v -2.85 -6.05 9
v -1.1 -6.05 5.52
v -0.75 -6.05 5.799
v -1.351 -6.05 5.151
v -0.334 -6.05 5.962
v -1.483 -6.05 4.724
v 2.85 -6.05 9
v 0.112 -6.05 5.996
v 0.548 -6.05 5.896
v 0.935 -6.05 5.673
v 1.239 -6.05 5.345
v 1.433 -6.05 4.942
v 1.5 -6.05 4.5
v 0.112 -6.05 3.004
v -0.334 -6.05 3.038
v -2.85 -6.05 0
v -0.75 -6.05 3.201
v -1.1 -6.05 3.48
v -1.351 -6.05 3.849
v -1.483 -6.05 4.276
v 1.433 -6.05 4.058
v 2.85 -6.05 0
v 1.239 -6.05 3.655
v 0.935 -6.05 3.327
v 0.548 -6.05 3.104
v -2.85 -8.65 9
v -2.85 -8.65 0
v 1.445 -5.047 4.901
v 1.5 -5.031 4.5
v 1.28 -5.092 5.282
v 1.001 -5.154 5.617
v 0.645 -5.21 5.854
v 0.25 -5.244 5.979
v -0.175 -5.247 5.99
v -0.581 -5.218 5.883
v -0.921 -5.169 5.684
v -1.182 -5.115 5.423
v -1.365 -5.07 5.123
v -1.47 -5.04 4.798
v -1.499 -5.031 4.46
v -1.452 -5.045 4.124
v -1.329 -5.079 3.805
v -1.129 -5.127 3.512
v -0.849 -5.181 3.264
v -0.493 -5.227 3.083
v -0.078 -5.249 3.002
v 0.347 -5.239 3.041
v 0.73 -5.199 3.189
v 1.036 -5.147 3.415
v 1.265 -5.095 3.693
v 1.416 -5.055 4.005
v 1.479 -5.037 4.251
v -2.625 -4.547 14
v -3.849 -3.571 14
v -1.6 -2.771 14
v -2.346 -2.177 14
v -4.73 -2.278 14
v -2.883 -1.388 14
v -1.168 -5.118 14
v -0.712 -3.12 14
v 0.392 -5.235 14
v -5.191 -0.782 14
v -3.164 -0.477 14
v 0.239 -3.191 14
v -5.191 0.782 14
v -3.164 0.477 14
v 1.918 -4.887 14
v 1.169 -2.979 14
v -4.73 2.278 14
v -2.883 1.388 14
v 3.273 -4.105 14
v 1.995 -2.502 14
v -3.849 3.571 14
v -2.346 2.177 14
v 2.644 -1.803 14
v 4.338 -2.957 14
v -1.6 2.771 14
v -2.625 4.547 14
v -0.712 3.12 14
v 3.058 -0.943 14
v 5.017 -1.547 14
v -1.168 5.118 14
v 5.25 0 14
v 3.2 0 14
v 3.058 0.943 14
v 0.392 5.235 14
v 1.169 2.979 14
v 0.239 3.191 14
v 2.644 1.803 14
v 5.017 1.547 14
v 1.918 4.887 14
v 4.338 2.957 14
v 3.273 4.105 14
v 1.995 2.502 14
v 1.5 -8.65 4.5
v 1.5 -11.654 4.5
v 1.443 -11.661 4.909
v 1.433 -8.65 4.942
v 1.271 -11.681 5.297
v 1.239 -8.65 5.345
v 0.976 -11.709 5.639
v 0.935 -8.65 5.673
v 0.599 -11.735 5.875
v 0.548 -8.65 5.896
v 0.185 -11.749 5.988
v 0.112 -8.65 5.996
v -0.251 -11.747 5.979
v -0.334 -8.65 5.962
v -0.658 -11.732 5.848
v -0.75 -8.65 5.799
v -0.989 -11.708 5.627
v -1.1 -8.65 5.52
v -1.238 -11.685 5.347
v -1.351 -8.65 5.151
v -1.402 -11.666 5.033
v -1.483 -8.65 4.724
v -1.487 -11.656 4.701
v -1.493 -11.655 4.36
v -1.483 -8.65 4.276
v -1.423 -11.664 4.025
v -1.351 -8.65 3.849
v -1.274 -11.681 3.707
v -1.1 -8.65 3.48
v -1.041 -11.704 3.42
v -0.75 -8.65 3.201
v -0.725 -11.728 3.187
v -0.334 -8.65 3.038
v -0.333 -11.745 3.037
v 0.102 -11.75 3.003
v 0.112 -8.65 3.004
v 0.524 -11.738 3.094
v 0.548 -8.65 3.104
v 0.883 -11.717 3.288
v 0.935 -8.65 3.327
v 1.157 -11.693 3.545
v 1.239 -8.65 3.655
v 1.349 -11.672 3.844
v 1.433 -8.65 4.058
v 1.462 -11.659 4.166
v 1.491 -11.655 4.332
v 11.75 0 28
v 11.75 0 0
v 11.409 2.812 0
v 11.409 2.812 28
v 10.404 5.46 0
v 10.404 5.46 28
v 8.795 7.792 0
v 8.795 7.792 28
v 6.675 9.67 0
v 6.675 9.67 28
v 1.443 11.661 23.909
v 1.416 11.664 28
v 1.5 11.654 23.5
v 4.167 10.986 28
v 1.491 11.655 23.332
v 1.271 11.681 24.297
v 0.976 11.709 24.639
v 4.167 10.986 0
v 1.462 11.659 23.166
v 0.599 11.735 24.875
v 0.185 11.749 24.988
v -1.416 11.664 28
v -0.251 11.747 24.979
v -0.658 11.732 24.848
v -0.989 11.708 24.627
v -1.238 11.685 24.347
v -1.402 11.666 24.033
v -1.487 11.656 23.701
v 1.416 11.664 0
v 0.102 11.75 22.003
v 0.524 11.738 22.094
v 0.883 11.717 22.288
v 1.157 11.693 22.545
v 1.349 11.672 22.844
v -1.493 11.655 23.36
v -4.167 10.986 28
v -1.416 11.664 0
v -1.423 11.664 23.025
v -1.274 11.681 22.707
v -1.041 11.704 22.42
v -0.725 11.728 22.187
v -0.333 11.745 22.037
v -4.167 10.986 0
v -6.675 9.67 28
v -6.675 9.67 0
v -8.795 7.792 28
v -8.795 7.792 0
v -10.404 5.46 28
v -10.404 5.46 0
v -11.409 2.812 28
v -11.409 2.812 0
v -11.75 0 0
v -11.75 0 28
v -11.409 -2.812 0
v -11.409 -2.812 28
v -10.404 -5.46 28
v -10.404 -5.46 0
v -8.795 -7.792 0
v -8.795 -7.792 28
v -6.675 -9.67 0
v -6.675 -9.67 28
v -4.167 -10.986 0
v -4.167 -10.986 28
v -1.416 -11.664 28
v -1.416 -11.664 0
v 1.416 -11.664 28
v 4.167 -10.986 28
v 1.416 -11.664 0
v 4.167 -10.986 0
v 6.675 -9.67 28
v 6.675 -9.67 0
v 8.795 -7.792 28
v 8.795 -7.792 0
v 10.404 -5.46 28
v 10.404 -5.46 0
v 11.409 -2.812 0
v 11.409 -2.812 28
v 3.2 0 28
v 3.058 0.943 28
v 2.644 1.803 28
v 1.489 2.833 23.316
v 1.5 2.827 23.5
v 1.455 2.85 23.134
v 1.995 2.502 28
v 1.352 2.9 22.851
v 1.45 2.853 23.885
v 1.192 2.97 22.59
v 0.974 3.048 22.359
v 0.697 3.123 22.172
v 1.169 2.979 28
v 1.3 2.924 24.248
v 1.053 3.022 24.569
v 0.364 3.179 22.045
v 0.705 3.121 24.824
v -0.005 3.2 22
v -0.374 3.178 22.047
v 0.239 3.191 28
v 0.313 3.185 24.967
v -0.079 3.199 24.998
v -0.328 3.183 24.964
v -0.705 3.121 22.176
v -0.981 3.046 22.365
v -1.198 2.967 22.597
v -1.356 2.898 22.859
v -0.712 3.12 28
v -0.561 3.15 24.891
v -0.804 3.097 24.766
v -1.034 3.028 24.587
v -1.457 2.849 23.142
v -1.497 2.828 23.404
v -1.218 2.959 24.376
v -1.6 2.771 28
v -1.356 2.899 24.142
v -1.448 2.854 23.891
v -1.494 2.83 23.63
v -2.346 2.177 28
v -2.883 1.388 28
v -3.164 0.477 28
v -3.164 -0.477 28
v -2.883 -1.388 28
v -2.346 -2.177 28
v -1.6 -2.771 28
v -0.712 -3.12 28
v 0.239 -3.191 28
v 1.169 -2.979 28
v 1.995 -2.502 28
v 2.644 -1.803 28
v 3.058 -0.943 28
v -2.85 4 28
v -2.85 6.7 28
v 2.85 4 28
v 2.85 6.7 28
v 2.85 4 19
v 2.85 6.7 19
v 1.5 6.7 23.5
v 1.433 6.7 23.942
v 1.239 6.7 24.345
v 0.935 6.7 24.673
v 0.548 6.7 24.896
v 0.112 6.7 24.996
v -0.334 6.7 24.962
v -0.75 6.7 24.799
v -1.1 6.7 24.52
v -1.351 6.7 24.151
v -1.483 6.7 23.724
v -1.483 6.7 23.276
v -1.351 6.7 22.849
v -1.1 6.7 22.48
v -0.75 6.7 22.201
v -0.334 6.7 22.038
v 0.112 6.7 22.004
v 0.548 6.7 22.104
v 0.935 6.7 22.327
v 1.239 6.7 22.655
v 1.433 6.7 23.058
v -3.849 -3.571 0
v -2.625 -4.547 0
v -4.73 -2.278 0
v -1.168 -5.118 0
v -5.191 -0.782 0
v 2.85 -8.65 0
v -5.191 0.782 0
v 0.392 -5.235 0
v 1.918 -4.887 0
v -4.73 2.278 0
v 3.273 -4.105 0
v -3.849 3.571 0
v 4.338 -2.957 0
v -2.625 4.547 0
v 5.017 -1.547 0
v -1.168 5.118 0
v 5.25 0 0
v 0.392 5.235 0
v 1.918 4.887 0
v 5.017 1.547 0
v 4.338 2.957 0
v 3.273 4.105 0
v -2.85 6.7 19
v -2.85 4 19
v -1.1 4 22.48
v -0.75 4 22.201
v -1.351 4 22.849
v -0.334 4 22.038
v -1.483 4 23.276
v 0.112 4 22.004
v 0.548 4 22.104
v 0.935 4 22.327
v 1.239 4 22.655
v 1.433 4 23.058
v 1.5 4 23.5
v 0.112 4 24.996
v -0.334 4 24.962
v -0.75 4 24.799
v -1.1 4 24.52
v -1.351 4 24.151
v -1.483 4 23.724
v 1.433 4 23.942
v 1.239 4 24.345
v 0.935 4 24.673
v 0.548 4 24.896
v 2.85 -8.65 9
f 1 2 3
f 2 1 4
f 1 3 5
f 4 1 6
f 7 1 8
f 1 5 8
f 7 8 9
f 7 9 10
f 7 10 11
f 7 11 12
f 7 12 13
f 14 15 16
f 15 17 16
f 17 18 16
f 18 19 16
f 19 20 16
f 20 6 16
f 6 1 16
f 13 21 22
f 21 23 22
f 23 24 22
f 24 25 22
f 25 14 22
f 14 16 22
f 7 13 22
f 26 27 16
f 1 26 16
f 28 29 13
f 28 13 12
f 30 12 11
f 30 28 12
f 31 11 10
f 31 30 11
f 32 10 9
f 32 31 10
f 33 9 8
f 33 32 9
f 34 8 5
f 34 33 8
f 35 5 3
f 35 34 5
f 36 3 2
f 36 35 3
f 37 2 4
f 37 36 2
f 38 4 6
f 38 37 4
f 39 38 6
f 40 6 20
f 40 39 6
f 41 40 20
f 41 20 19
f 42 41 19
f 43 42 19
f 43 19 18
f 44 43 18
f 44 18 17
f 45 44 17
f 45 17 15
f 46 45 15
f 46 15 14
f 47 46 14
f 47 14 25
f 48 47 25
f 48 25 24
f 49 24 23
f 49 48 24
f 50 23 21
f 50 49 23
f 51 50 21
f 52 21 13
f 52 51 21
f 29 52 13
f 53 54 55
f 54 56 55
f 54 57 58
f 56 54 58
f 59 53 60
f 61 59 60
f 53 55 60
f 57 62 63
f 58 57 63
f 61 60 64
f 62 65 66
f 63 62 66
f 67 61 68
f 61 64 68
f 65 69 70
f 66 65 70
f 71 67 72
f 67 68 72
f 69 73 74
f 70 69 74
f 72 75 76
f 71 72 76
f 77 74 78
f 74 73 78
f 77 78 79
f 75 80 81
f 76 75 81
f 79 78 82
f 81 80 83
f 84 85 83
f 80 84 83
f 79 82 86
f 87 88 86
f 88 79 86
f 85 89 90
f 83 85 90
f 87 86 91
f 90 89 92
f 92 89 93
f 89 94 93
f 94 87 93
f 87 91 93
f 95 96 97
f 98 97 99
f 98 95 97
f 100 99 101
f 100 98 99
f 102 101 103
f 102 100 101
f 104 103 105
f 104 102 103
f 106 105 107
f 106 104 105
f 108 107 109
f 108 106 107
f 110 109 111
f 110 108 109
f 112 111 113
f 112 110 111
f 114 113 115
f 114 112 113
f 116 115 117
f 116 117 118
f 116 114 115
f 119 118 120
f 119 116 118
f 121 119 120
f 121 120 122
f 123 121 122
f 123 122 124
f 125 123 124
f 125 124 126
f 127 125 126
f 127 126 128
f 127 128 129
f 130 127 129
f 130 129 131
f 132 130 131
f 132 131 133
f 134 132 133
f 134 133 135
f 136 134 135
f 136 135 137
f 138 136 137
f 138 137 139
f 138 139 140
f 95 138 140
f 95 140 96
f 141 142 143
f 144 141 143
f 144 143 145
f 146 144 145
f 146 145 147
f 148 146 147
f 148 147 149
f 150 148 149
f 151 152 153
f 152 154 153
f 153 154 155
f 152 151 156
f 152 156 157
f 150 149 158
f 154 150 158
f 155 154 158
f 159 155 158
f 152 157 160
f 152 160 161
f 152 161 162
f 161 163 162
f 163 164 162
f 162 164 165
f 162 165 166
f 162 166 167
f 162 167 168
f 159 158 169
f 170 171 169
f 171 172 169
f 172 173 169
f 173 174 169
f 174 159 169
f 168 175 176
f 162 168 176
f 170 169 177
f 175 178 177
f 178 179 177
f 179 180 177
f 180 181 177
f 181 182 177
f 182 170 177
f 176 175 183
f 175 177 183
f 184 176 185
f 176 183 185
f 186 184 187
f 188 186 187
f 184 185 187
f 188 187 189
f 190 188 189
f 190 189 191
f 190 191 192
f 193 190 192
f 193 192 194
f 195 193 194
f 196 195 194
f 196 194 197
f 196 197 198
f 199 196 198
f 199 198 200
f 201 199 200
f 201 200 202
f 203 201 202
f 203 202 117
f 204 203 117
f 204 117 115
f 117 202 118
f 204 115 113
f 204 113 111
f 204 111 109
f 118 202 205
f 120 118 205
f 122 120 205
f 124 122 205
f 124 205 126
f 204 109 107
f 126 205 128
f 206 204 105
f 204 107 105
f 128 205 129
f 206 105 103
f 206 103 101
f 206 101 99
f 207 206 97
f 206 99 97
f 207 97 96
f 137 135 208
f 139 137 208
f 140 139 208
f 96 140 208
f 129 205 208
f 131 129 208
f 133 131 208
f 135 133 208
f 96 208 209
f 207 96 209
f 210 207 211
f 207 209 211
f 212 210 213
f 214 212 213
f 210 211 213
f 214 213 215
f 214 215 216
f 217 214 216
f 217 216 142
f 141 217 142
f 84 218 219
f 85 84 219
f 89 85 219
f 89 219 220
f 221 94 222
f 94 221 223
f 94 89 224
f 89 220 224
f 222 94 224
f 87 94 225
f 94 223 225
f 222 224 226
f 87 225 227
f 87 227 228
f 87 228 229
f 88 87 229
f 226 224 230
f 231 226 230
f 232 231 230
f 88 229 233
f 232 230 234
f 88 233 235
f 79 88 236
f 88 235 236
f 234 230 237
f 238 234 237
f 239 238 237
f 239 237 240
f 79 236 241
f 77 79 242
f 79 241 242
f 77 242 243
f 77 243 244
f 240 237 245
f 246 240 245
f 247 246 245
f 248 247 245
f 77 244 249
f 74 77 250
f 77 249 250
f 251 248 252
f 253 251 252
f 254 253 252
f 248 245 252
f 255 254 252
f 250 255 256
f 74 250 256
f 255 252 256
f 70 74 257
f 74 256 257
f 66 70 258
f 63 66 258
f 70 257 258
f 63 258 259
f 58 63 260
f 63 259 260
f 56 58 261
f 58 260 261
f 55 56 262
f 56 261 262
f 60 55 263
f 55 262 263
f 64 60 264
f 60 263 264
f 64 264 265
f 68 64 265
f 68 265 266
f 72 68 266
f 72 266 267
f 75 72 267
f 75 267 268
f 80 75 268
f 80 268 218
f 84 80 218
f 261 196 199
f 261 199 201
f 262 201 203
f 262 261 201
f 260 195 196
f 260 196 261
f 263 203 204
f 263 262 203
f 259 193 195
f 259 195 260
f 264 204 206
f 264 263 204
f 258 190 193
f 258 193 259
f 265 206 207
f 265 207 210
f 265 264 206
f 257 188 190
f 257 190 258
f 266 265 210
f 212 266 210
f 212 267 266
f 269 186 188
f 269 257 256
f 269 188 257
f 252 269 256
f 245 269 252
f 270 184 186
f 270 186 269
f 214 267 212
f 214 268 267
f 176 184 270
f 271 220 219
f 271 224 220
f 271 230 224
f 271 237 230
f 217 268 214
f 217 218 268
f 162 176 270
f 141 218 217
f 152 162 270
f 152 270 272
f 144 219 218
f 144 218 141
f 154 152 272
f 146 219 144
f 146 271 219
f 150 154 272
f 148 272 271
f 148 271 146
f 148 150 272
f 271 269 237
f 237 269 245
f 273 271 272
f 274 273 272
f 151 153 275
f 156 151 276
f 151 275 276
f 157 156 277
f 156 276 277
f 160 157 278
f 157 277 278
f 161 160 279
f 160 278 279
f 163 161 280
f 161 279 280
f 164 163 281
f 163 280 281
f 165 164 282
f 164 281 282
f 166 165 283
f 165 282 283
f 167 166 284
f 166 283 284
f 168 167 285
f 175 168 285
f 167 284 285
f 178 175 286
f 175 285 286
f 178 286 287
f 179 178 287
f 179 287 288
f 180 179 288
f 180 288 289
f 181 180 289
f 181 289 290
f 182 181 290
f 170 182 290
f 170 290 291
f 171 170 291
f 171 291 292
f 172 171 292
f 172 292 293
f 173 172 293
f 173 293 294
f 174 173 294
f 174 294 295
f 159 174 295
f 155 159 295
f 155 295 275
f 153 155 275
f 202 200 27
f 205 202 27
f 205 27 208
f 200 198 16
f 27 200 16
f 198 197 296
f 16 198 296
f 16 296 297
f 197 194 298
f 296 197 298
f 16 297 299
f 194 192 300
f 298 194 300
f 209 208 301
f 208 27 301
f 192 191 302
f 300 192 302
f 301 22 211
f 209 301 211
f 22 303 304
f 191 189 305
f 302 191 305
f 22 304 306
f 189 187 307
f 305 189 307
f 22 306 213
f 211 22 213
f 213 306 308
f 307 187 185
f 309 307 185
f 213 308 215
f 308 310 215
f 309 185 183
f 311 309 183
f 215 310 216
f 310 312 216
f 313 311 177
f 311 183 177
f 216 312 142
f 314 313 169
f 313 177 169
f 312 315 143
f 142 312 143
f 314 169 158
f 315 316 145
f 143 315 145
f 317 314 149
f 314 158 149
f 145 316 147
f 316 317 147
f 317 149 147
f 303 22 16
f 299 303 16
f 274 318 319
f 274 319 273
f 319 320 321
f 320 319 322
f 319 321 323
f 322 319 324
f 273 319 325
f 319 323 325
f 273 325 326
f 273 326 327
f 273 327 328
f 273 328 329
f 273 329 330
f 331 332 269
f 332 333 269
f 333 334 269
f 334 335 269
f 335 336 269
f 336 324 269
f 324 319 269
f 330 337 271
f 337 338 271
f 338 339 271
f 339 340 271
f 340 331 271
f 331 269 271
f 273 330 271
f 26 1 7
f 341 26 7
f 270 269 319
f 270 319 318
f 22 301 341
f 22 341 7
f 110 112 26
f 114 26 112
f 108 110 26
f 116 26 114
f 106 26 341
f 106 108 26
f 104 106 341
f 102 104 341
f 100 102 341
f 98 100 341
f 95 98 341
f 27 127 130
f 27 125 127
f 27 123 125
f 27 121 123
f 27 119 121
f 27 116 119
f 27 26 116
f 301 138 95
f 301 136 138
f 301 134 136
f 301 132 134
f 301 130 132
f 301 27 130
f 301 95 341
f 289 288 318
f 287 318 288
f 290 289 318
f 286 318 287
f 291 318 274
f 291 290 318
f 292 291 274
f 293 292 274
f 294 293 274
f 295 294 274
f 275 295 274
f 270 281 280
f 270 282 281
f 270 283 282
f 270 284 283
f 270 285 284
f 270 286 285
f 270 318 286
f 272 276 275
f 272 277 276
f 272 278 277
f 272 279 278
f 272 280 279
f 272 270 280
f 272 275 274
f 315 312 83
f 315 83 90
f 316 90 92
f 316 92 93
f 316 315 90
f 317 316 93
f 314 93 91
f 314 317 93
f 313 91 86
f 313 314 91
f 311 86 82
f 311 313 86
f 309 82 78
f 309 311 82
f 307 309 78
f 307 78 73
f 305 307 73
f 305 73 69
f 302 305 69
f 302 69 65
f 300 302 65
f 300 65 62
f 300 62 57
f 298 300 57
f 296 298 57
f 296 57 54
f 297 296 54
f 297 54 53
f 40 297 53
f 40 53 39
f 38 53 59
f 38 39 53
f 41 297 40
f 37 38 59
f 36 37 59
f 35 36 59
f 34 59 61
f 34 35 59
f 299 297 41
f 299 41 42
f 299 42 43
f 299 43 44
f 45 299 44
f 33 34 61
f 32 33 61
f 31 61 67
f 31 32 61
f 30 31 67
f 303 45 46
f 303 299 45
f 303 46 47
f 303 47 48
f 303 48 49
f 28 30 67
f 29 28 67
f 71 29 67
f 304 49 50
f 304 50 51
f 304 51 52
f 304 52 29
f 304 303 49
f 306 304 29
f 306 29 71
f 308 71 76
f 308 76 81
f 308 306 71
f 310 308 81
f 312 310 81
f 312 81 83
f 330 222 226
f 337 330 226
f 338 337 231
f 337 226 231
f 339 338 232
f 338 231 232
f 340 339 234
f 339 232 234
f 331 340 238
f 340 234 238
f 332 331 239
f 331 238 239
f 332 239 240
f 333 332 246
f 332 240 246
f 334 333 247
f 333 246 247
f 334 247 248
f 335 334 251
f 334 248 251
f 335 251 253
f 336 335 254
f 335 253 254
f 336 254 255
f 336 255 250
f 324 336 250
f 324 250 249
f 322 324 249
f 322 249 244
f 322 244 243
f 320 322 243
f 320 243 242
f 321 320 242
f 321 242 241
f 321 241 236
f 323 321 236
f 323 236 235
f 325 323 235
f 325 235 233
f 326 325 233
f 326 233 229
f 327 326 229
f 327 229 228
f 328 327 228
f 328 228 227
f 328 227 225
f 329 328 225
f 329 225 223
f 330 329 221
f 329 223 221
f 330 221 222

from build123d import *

# Parameters (mm, degrees)
F0_R      = 11.75
F3_DEPTH  = 28
F4_R      = 5.25
F5_DEPTH  = 14
F2_R      = 3.2
F6_DEPTH  = 14
F7_W      = 5.7
F7_H      = 2.7
F8_DEPTH  = 9
F9_W      = 5.7
F9_H      = 2.6
F10_DEPTH = 9
F11_R     = 1.5
F12_DEPTH = 25
F13_R     = 1.5
F14_DEPTH = 25


with BuildPart() as f3:
    # F0 (on Top) → F3 (new body)
    with BuildSketch(Plane.XY):
        Circle(F0_R)
    extrude(amount=F3_DEPTH)

    # F4 (on Top) → F5 (cut)
    with BuildSketch(Plane.XY):
        Circle(F4_R)
    extrude(amount=F5_DEPTH, mode=Mode.SUBTRACT)

    # F2 (on offset) → F6 (cut)
    with BuildSketch(Plane.XY.offset(28)):
        Circle(F2_R)
    extrude(amount=-F6_DEPTH, mode=Mode.SUBTRACT)

    # F7 (on offset) → F8 (cut)
    with BuildSketch(Plane.XY.offset(28)):
        with Locations((0, 5.35)):
            Rectangle(F7_W, F7_H)
    extrude(amount=-F8_DEPTH, mode=Mode.SUBTRACT)

    # F9 (on Top) → F10 (cut)
    with BuildSketch(Plane.XY):
        with Locations((0, -7.35)):
            Rectangle(F9_W, F9_H)
    extrude(amount=F10_DEPTH, mode=Mode.SUBTRACT)

    # F11 (on Front) → F12 (cut)
    with BuildSketch(Plane.XZ):
        with Locations((0, 4.5)):
            Circle(F11_R)
    extrude(amount=F12_DEPTH, mode=Mode.SUBTRACT)

    # F13 (on Front) → F14 (cut)
    with BuildSketch(Plane.XZ):
        with Locations((0, 23.5)):
            Circle(F13_R)
    extrude(amount=-F14_DEPTH, mode=Mode.SUBTRACT)


solid = f3.part
